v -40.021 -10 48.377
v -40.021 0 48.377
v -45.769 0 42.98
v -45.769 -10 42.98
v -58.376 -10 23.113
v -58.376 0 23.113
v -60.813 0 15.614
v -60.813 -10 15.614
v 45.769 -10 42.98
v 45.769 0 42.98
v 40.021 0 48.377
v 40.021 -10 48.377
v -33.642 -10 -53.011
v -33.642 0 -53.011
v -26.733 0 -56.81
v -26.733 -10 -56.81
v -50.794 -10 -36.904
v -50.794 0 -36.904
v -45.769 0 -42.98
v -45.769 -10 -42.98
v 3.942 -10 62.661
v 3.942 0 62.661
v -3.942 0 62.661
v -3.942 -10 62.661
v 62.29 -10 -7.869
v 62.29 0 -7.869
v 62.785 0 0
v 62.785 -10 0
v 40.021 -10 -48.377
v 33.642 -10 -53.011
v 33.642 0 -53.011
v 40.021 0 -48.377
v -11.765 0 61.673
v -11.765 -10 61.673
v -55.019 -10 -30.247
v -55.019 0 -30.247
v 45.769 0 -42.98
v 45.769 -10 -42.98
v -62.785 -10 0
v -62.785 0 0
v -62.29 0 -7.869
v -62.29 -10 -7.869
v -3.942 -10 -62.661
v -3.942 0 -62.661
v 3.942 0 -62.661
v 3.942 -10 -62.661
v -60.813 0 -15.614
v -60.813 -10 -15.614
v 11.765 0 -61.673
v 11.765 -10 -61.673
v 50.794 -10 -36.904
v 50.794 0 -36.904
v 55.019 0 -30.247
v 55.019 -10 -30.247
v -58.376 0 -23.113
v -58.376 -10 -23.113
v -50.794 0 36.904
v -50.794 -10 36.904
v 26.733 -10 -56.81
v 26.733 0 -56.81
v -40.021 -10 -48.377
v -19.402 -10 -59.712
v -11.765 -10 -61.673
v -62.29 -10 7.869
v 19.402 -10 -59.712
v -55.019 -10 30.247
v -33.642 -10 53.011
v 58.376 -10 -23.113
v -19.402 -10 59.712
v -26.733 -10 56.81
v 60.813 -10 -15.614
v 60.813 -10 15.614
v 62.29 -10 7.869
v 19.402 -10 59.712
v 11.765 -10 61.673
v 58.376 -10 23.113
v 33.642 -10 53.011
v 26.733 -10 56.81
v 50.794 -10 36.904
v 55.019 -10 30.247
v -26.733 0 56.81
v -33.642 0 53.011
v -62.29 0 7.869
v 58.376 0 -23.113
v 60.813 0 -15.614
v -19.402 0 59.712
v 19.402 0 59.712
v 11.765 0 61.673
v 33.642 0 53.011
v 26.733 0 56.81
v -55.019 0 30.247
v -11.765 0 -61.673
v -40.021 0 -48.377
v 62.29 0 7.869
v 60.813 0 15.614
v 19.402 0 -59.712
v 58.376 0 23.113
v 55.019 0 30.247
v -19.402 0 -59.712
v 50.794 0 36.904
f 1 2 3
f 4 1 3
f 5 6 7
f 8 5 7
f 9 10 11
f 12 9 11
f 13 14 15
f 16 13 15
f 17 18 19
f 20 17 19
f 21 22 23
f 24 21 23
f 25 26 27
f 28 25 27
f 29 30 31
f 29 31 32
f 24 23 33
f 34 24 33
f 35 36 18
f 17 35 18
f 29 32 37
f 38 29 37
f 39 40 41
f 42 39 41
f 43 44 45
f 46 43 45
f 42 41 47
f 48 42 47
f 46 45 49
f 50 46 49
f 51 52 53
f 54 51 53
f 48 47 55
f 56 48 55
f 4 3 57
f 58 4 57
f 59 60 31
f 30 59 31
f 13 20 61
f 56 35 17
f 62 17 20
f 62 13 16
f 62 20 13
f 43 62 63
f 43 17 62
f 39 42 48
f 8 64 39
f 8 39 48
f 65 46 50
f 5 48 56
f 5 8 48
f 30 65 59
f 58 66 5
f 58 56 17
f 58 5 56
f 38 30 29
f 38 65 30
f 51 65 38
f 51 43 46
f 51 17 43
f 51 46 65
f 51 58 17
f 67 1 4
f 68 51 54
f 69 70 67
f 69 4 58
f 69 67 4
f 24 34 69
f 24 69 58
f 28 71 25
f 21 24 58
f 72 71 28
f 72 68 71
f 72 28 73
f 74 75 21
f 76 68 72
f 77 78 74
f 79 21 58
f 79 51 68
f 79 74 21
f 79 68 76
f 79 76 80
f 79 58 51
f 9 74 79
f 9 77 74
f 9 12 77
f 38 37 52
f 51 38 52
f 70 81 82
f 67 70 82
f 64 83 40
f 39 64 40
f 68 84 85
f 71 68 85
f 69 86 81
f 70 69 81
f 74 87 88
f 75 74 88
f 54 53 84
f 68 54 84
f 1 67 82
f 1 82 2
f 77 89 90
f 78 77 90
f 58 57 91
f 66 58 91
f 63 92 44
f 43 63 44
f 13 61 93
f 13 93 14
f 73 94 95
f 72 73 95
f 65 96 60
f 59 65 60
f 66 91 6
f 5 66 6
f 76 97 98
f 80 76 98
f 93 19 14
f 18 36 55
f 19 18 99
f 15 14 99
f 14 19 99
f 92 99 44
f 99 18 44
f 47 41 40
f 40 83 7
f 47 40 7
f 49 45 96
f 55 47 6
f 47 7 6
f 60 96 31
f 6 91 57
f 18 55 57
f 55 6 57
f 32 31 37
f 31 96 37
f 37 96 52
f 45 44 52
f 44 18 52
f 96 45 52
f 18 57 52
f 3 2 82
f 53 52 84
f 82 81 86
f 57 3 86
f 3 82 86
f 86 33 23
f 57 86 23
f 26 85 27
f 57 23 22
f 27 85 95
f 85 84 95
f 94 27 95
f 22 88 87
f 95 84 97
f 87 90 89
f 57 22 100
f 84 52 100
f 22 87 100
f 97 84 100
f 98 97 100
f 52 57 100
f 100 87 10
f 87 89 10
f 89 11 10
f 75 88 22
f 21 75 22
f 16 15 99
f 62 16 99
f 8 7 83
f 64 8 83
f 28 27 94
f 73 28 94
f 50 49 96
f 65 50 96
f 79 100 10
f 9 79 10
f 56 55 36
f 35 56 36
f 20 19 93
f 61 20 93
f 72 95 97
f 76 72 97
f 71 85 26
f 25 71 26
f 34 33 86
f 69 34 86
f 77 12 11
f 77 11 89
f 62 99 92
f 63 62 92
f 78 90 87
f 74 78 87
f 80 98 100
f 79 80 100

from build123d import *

# Parameters (mm, degrees)
F2_DEPTH = 10


with BuildPart() as f2:
    # F0 (on Front) → F2 (new body)
    with BuildSketch(Plane.XZ):
        Polygon((3.942324, 62.661439), (-3.942324, 62.661439), (-11.764798, 61.673231), (-19.401734, 59.712399), (-26.732694, 56.809867), (-33.642063, 53.011409), (-40.020877, 48.37693), (-45.768537, 42.979517), (-50.7944, 36.904292), (-55.019206, 30.247064), (-58.376325, 23.112822), (-60.812815, 15.614077), (-62.290251, 7.869089), (-62.785332, 0), (-62.290251, -7.869089), (-60.812815, -15.614077), (-58.376325, -23.112822), (-55.019206, -30.247064), (-50.7944, -36.904292), (-45.768537, -42.979517), (-40.020877, -48.37693), (-33.642063, -53.011409), (-26.732694, -56.809867), (-19.401734, -59.712399), (-11.764798, -61.673231), (-3.942324, -62.661439), (3.942324, -62.661439), (11.764798, -61.673231), (19.401734, -59.712399), (26.732694, -56.809867), (33.642063, -53.011409), (40.020877, -48.37693), (45.768537, -42.979517), (50.7944, -36.904292), (55.019206, -30.247064), (58.376325, -23.112822), (60.812815, -15.614077), (62.290251, -7.869089), (62.785332, 0), (62.290251, 7.869089), (60.812815, 15.614077), (58.376325, 23.112822), (55.019206, 30.247064), (50.7944, 36.904292), (45.768537, 42.979517), (40.020877, 48.37693), (33.642063, 53.011409), (26.732694, 56.809867), (19.401734, 59.712399), (11.764798, 61.673231), align=None)
    extrude(amount=F2_DEPTH)


solid = f2.part
